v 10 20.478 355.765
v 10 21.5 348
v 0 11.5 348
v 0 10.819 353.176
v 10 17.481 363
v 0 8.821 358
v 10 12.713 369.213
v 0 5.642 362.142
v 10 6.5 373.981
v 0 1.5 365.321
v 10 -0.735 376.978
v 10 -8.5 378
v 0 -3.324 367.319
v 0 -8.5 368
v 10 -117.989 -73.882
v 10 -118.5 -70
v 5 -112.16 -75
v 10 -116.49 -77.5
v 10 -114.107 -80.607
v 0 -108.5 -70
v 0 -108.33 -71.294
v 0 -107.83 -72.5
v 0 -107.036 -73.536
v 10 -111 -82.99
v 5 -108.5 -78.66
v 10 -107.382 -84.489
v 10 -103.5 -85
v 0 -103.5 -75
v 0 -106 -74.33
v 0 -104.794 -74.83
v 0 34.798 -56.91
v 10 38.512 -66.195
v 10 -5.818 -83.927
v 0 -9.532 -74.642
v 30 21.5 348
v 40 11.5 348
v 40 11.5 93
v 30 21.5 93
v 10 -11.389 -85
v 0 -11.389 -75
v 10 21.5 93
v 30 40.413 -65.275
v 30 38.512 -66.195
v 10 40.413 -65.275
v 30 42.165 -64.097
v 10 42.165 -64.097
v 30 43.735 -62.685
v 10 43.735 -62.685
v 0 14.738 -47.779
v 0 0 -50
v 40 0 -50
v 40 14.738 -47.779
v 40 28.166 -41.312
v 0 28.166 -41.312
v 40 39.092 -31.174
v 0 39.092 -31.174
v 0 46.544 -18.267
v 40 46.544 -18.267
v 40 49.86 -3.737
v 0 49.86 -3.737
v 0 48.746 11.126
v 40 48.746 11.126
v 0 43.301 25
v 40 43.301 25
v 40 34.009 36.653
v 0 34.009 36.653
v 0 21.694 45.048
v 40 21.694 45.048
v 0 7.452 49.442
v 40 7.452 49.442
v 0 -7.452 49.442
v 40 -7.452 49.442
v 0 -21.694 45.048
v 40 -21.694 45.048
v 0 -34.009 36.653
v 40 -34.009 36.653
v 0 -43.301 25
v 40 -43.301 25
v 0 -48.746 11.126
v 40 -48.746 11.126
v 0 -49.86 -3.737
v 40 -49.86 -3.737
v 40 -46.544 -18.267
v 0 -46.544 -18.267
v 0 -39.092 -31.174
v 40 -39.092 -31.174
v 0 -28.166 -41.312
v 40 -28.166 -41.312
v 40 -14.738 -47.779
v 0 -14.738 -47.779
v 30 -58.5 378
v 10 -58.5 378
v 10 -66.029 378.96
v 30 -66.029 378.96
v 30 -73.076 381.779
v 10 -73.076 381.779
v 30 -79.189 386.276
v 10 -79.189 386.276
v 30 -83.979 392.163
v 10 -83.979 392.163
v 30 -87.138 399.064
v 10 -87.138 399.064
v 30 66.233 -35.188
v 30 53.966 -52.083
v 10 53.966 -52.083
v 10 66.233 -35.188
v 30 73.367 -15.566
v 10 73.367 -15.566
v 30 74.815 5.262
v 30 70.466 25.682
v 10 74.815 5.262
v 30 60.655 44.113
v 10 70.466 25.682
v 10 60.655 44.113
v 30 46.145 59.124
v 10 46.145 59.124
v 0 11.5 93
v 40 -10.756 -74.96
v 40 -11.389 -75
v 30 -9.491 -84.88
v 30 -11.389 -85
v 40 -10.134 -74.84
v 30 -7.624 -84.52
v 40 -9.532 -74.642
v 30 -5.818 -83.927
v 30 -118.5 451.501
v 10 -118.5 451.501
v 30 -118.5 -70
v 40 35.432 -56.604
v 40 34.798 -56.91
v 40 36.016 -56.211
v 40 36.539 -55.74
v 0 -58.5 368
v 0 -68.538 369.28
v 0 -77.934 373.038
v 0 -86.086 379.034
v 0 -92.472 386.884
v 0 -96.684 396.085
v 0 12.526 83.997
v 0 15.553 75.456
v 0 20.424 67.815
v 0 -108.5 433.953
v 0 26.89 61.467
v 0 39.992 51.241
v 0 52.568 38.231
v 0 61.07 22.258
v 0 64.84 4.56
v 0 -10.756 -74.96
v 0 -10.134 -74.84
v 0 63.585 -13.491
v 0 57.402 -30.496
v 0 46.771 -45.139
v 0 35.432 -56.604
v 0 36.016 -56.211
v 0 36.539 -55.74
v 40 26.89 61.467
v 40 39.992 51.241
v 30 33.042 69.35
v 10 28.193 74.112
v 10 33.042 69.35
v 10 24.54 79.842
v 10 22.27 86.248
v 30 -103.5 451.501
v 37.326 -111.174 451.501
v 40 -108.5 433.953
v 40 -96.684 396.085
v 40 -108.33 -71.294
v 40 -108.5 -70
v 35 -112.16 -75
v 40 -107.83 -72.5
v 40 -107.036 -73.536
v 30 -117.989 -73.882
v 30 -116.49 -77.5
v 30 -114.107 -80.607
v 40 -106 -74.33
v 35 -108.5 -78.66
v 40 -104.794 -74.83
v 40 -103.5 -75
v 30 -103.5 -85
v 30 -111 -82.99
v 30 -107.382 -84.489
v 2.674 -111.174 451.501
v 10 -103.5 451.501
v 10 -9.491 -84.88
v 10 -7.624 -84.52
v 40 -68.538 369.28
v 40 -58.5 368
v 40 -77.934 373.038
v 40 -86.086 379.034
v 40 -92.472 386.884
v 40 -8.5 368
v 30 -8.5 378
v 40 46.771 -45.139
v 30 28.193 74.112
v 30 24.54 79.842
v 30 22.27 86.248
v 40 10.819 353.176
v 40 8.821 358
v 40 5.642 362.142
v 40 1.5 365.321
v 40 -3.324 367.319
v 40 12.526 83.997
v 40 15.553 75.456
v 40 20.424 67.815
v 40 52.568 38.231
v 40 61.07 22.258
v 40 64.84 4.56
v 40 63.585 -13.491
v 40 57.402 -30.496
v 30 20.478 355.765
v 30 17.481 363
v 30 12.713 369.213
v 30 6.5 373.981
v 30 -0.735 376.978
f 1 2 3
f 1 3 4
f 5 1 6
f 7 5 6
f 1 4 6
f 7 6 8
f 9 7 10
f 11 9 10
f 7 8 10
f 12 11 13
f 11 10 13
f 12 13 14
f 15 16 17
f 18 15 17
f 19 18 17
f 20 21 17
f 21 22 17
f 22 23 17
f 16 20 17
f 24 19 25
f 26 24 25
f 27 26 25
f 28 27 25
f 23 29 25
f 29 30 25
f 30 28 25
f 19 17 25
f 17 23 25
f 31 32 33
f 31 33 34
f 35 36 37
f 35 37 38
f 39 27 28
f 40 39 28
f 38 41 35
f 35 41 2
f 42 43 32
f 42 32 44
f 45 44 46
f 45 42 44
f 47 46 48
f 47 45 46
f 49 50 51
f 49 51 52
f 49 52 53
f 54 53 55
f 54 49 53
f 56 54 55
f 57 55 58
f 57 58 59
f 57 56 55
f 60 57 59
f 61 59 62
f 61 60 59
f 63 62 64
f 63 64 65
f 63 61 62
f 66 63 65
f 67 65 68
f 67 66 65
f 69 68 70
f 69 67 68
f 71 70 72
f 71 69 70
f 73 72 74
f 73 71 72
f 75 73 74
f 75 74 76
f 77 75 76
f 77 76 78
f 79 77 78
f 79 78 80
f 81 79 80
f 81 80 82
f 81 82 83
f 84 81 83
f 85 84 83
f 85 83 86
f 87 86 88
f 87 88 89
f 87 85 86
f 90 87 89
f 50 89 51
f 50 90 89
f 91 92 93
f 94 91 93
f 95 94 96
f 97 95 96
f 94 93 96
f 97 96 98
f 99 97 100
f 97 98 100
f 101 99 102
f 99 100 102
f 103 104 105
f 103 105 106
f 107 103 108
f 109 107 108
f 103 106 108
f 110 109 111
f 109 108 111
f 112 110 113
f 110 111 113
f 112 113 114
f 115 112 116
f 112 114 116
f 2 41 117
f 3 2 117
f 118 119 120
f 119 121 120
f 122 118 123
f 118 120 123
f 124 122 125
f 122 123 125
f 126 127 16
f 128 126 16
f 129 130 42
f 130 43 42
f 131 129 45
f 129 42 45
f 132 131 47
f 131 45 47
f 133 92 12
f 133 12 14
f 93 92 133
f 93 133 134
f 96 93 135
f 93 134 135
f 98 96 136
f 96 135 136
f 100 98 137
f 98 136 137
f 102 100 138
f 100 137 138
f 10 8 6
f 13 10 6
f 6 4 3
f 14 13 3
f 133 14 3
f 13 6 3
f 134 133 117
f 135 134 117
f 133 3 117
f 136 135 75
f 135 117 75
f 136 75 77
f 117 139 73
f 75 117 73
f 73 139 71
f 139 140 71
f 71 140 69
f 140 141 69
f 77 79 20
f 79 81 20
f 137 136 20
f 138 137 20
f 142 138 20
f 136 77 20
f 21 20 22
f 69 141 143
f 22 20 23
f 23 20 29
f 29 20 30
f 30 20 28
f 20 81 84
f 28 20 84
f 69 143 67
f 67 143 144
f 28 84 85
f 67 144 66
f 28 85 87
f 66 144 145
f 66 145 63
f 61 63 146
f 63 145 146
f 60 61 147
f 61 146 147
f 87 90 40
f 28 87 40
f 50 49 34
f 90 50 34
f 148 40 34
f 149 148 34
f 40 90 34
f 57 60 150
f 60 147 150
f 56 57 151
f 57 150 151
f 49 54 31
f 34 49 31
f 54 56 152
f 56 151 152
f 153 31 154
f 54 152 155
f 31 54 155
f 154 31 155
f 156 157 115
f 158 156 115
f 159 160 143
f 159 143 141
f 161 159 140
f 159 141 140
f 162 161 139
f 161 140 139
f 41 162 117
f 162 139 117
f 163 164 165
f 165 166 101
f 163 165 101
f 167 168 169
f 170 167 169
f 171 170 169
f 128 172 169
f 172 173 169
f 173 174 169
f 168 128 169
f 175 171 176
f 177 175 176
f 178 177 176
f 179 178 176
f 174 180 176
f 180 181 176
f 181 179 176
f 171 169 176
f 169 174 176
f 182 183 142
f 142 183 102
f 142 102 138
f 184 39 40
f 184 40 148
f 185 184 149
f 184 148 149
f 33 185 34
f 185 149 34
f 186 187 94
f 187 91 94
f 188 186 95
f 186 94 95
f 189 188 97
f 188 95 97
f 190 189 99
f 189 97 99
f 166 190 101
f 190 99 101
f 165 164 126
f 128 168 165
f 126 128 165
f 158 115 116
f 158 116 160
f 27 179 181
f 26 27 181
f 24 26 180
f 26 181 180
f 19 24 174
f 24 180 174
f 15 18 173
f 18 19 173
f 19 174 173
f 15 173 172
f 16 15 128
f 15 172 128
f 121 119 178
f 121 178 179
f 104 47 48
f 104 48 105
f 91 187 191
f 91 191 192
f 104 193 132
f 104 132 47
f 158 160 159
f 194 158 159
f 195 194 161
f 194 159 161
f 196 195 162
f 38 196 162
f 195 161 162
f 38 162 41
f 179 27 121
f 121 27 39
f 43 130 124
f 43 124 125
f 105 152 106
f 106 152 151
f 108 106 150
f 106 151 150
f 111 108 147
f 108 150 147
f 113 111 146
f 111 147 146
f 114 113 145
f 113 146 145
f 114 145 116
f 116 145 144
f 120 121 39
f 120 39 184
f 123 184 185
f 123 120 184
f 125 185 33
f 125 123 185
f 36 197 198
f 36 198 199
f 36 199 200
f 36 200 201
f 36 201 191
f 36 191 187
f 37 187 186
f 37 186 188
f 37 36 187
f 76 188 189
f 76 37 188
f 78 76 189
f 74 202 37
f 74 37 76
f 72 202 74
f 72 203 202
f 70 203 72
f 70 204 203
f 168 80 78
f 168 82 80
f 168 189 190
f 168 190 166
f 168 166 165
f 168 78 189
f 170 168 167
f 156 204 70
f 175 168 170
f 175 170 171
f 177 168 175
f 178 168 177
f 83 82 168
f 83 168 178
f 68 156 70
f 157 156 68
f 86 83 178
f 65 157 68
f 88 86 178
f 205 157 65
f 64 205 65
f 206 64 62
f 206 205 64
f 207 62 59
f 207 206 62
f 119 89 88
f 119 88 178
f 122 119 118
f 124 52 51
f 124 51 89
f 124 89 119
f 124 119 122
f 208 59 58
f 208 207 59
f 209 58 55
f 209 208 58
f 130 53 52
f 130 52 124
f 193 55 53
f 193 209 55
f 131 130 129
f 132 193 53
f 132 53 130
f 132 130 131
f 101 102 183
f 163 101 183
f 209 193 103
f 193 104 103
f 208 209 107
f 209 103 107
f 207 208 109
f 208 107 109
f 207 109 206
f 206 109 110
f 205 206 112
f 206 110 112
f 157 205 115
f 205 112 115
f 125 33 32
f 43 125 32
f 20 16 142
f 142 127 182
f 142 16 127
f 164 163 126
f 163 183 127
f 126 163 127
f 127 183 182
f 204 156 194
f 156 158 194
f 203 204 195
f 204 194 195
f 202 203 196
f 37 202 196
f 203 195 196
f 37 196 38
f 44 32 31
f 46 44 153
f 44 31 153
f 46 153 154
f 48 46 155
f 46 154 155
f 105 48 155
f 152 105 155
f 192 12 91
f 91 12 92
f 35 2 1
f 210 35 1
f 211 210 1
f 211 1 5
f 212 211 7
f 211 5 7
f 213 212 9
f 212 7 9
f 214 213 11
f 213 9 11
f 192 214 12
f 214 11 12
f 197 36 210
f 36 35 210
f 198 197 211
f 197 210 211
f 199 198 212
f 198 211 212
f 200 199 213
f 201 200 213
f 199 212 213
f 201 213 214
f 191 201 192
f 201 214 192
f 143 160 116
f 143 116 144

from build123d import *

# Parameters (mm, degrees)
SKETCH_1_R      = 50
EXTRUDE_1_DEPTH = 40
FILLET_1_R      = 15
FILLET_2_R      = 15
CHAMFER_1_SIZE  = 10


with BuildPart() as part:
    # 草图1 → 凸台-拉伸1 (new body)
    with BuildSketch(Plane(origin=(0, 0, 0), x_dir=(0, 0, -1), z_dir=(1, 0, 0))):
        with BuildLine():
            Line((85, -8.5), (65, 41.5))
            Line((65, 41.5), (52.08314884, 53.966152419))
            ThreePointArc((52.08314884, 53.966152419), (-5.26193851, 74.815185645), (-59.124192044, 46.14466291))
            Line((-59.124192044, 46.14466291), (-69.350323182, 33.042134836))
            ThreePointArc((-69.350323182, 33.042134836), (-79.842035775, 24.539510808), (-93, 21.5))
            Line((-93, 21.5), (-348, 21.5))
            ThreePointArc((-348, 21.5), (-369.213203436, 12.713203436), (-378, -8.5))
            Line((-378, -8.5), (-378, -58.5))
            ThreePointArc((-378, -58.5), (-383.833102889, -76.275294204), (-399.064072268, -87.138247076))
            Line((-399.064072268, -87.138247076), (-451.500924593, -103.5))
            Line((-451.500924593, -103.5), (-451.500924593, -118.5))
            Line((-451.500924593, -118.5), (-116.500924593, -118.5))
            Line((-116.500924593, -118.5), (85, -118.5))
            Line((85, -118.5), (85, -8.5))
        make_face()
        Circle(SKETCH_1_R, mode=Mode.SUBTRACT)
    extrude(amount=EXTRUDE_1_DEPTH)

    # 圆角1
    fillet_1_edges = [part.edges().sort_by_distance(p)[0] for p in [
        (20, -118.5, -85),
    ]]
    fillet(fillet_1_edges, radius=FILLET_1_R)

    # 圆角2
    fillet_2_edges = [part.edges().sort_by_distance(p)[0] for p in [
        (20, 41.5, -65),
        (20, -8.5, -85),
    ]]
    fillet(fillet_2_edges, radius=FILLET_2_R)

    # 倒角1
    # the kernel refuses this chamfer: 10 mm, written as the material it takes off along each edge
    with BuildSketch(Plane(origin=(40, -118.5, -70), x_dir=(0.027495876610586317, 0.9996219169112968, 0), z_dir=(0, 0, 1))) as chamfer_1_piece_1:
        Polygon((CHAMFER_1_SIZE * 0.999621916911, CHAMFER_1_SIZE * 0.0274958766106), (-CHAMFER_1_SIZE * 0.0274958766106, CHAMFER_1_SIZE * 0.999621916911), (0, 0), align=None)
    extrude(amount=547.217754472, mode=Mode.SUBTRACT)
    with BuildSketch(Plane(origin=(0, -118.5, 477.217754472), x_dir=(0.9996219169112968, -0.027495876610586317, 0), z_dir=(0, 0, -1))) as chamfer_1_piece_2:
        Polygon((CHAMFER_1_SIZE * 0.999621916911, -CHAMFER_1_SIZE * 0.0274958766106), (-CHAMFER_1_SIZE * 0.0274958766106, -CHAMFER_1_SIZE * 0.999621916911), (0, 0), align=None)
    extrude(amount=547.217754472, mode=Mode.SUBTRACT)
    with BuildSketch(Plane(origin=(40, -87.138247076, 399.064072268), x_dir=(0.02749587661058635, -0.9542473146313191, -0.2977516402781551), z_dir=(0, -0.297864257716727, 0.9546082358616352)), Plane(origin=(0, -87.138247076, 399.064072268), x_dir=(0.9996219169112968, 0.026247790264700862, 0.008190038876882964), z_dir=(0, -0.297864257716727, 0.9546082358616352))) as chamfer_1_piece_3:
        Polygon((CHAMFER_1_SIZE * 0.999621916911, -CHAMFER_1_SIZE * 0.0274958766106), (-CHAMFER_1_SIZE * 0.0274958766106, -CHAMFER_1_SIZE * 0.999621916911), (0, 0), align=None)
    extrude(amount=80.647062361, mode=Mode.SUBTRACT)
    with BuildSketch(Plane(origin=(40, -58.5, 408), x_dir=(0, 0, -1), z_dir=(0, 1, 0))) as chamfer_1_piece_4:
        Polygon((30 + CHAMFER_1_SIZE, 0), (30, CHAMFER_1_SIZE), (30, 0), align=None)
    revolve(axis=Axis((40, -58.5, 408), (-1, 0, 0)), revolution_arc=72.670629443, mode=Mode.SUBTRACT)
    with BuildSketch(Plane(origin=(40, -8.5, 378), x_dir=(0.027495876610586282, 0, -0.9996219169112968), z_dir=(0, -1, 0)), Plane(origin=(0, -8.5, 378), x_dir=(0.9996219169112968, 0, 0.0274958766105877), z_dir=(0, -1, 0))) as chamfer_1_piece_5:
        Polygon((CHAMFER_1_SIZE * 0.999621916911, -CHAMFER_1_SIZE * 0.0274958766106), (-CHAMFER_1_SIZE * 0.0274958766106, -CHAMFER_1_SIZE * 0.999621916911), (0, 0), align=None)
    extrude(amount=50, mode=Mode.SUBTRACT)
    with BuildSketch(Plane(origin=(40, -8.5, 348), x_dir=(0, 1, 0), z_dir=(0, 0, -1))) as chamfer_1_piece_6:
        Polygon((30 - CHAMFER_1_SIZE, 0), (30, -CHAMFER_1_SIZE), (30, 0), align=None)
    revolve(axis=Axis((40, -8.5, 348), (1, 0, 0)), revolution_arc=90, mode=Mode.SUBTRACT)
    with BuildSketch(Plane(origin=(40, 21.5, 93), x_dir=(0.027495876610586317, -0.9996219169112968, 0), z_dir=(0, 0, 1)), Plane(origin=(0, 21.5, 93), x_dir=(0.9996219169112968, 0.027495876610586317, 0), z_dir=(0, 0, 1))) as chamfer_1_piece_7:
        Polygon((CHAMFER_1_SIZE * 0.999621916911, -CHAMFER_1_SIZE * 0.0274958766106), (-CHAMFER_1_SIZE * 0.0274958766106, -CHAMFER_1_SIZE * 0.999621916911), (0, 0), align=None)
    extrude(amount=255, mode=Mode.SUBTRACT)
    with BuildSketch(Plane(origin=(40, 51.5, 93), x_dir=(0, -0.6152621721387623, -0.7883225605899479), z_dir=(0, 0.7883225605899479, -0.6152621721387623))) as chamfer_1_piece_8:
        Polygon((30 + CHAMFER_1_SIZE, 0), (30, CHAMFER_1_SIZE), (30, 0), align=None)
    revolve(axis=Axis((40, 51.5, 93), (-1, 0, 0)), revolution_arc=52.029027347, mode=Mode.SUBTRACT)
    with BuildSketch(Plane(origin=(40, 46.14466291, 59.124192044), x_dir=(0.027495876610586327, -0.6150295519163572, -0.788024509161346), z_dir=(0, -0.7883225605899483, 0.6152621721387617)), Plane(origin=(0, 46.14466291, 59.124192044), x_dir=(0.9996219169112968, 0.016917172768288757, 0.021675619855322733), z_dir=(0, -0.7883225605899483, 0.6152621721387617))) as chamfer_1_piece_9:
        Polygon((CHAMFER_1_SIZE * 0.999621916911, -CHAMFER_1_SIZE * 0.0274958766106), (-CHAMFER_1_SIZE * 0.0274958766106, -CHAMFER_1_SIZE * 0.999621916911), (0, 0), align=None)
    extrude(amount=16.620770139, mode=Mode.SUBTRACT)
    with BuildSketch(Plane(origin=(40, 0, 0), x_dir=(0, 0.7195486989139618, -0.6944419845395472), z_dir=(0, -0.6944419845395472, -0.7195486989139618))) as chamfer_1_piece_10:
        Polygon((75 - CHAMFER_1_SIZE, 0), (75, -CHAMFER_1_SIZE), (75, 0), align=None)
    revolve(axis=Axis((40, 0, 0), (1, 0, 0)), revolution_arc=96.011794601, mode=Mode.SUBTRACT)
    with BuildSketch(Plane(origin=(40, 43.734636446, -62.684572962), x_dir=(0.027495876610586317, -0.7192766497194039, 0.6941794277691075), z_dir=(0, 0.6944419845395474, 0.7195486989139617)), Plane(origin=(0, 43.734636446, -62.684572962), x_dir=(0.9996219169112968, 0.019784622240646275, -0.019094291120110143), z_dir=(0, 0.6944419845395474, 0.7195486989139617))) as chamfer_1_piece_11:
        Polygon((CHAMFER_1_SIZE * 0.999621916911, -CHAMFER_1_SIZE * 0.0274958766106), (-CHAMFER_1_SIZE * 0.0274958766106, -CHAMFER_1_SIZE * 0.999621916911), (0, 0), align=None)
    extrude(amount=14.733435189, mode=Mode.SUBTRACT)
    with BuildSketch(Plane(origin=(40, 32.941405963, -52.267943193), x_dir=(0, 0.3713906763541047, -0.9284766908852589), z_dir=(0, -0.9284766908852589, -0.3713906763541047))) as chamfer_1_piece_12:
        Polygon((15 - CHAMFER_1_SIZE, 0), (15, -CHAMFER_1_SIZE), (15, 0), align=None)
    revolve(axis=Axis((40, 32.941405963, -52.267943193), (1, 0, 0)), revolution_arc=24.215823259, mode=Mode.SUBTRACT)
    with BuildSketch(Plane(origin=(40, -5.817875908, -83.927150363), x_dir=(0.027495876610586313, -0.37125025982007287, 0.9281256495501801), z_dir=(0, 0.9284766908852591, 0.37139067635410444)), Plane(origin=(0, -5.817875908, -83.927150363), x_dir=(0.9996219169112968, 0.010211712211354702, -0.025529280528386704), z_dir=(0, 0.9284766908852591, 0.37139067635410444))) as chamfer_1_piece_13:
        Polygon((CHAMFER_1_SIZE * 0.999621916911, -CHAMFER_1_SIZE * 0.0274958766106), (-CHAMFER_1_SIZE * 0.0274958766106, -CHAMFER_1_SIZE * 0.999621916911), (0, 0), align=None)
    extrude(amount=47.745024136, mode=Mode.SUBTRACT)
    with BuildSketch(Plane(origin=(40, -11.388736054, -70), x_dir=(0, 0, -1), z_dir=(0, -1, 0))) as chamfer_1_piece_14:
        Polygon((15 - CHAMFER_1_SIZE, 0), (15, -CHAMFER_1_SIZE), (15, 0), align=None)
    revolve(axis=Axis((40, -11.388736054, -70), (1, 0, 0)), revolution_arc=21.801409486, mode=Mode.SUBTRACT)
    with BuildSketch(Plane(origin=(40, -103.5, -85), x_dir=(0.027495876610586282, 0, 0.9996219169112968), z_dir=(0, 1, 0)), Plane(origin=(0, -103.5, -85), x_dir=(0.9996219169112968, 0, -0.027495876610586317), z_dir=(0, 1, 0))) as chamfer_1_piece_15:
        Polygon((CHAMFER_1_SIZE * 0.999621916911, -CHAMFER_1_SIZE * 0.0274958766106), (-CHAMFER_1_SIZE * 0.0274958766106, -CHAMFER_1_SIZE * 0.999621916911), (0, 0), align=None)
    extrude(amount=92.111263946, mode=Mode.SUBTRACT)
    with BuildSketch(Plane(origin=(40, -103.5, -70), x_dir=(0, -1, 0), z_dir=(0, 0, 1))) as chamfer_1_piece_16:
        Polygon((15 - CHAMFER_1_SIZE, 0), (15, -CHAMFER_1_SIZE), (15, 0), align=None)
    revolve(axis=Axis((40, -103.5, -70), (1, 0, 0)), revolution_arc=90, mode=Mode.SUBTRACT)
    with BuildSketch(Plane(origin=(0, -58.5, 408), x_dir=(0, 0, -1), z_dir=(0, 1, 0))) as chamfer_1_piece_17:
        Polygon((30, -CHAMFER_1_SIZE), (30 + CHAMFER_1_SIZE, 0), (30, 0), align=None)
    revolve(axis=Axis((0, -58.5, 408), (-1, 0, 0)), revolution_arc=72.670629443, mode=Mode.SUBTRACT)
    with BuildSketch(Plane(origin=(0, -8.5, 348), x_dir=(0, 1, 0), z_dir=(0, 0, -1))) as chamfer_1_piece_18:
        Polygon((30, CHAMFER_1_SIZE), (30 - CHAMFER_1_SIZE, 0), (30, 0), align=None)
    revolve(axis=Axis((0, -8.5, 348), (1, 0, 0)), revolution_arc=90, mode=Mode.SUBTRACT)
    with BuildSketch(Plane(origin=(0, 51.5, 93), x_dir=(0, -0.6152621721387623, -0.7883225605899479), z_dir=(0, 0.7883225605899479, -0.6152621721387623))) as chamfer_1_piece_19:
        Polygon((30, -CHAMFER_1_SIZE), (30 + CHAMFER_1_SIZE, 0), (30, 0), align=None)
    revolve(axis=Axis((0, 51.5, 93), (-1, 0, 0)), revolution_arc=52.029027347, mode=Mode.SUBTRACT)
    with BuildSketch(Plane(origin=(0, 0, 0), x_dir=(0, 0.7195486989139618, -0.6944419845395472), z_dir=(0, -0.6944419845395472, -0.7195486989139618))) as chamfer_1_piece_20:
        Polygon((75, CHAMFER_1_SIZE), (75 - CHAMFER_1_SIZE, 0), (75, 0), align=None)
    revolve(axis=Axis((0, 0, 0), (1, 0, 0)), revolution_arc=96.011794601, mode=Mode.SUBTRACT)
    with BuildSketch(Plane(origin=(0, 32.941405963, -52.267943193), x_dir=(0, 0.3713906763541047, -0.9284766908852589), z_dir=(0, -0.9284766908852589, -0.3713906763541047))) as chamfer_1_piece_21:
        Polygon((15, CHAMFER_1_SIZE), (15 - CHAMFER_1_SIZE, 0), (15, 0), align=None)
    revolve(axis=Axis((0, 32.941405963, -52.267943193), (1, 0, 0)), revolution_arc=24.215823259, mode=Mode.SUBTRACT)
    with BuildSketch(Plane(origin=(0, -11.388736054, -70), x_dir=(0, 0, -1), z_dir=(0, -1, 0))) as chamfer_1_piece_22:
        Polygon((15, CHAMFER_1_SIZE), (15 - CHAMFER_1_SIZE, 0), (15, 0), align=None)
    revolve(axis=Axis((0, -11.388736054, -70), (1, 0, 0)), revolution_arc=21.801409486, mode=Mode.SUBTRACT)
    with BuildSketch(Plane(origin=(0, -103.5, -70), x_dir=(0, -1, 0), z_dir=(0, 0, 1))) as chamfer_1_piece_23:
        Polygon((15, CHAMFER_1_SIZE), (15 - CHAMFER_1_SIZE, 0), (15, 0), align=None)
    revolve(axis=Axis((0, -103.5, -70), (1, 0, 0)), revolution_arc=90, mode=Mode.SUBTRACT)


solid = part.part
